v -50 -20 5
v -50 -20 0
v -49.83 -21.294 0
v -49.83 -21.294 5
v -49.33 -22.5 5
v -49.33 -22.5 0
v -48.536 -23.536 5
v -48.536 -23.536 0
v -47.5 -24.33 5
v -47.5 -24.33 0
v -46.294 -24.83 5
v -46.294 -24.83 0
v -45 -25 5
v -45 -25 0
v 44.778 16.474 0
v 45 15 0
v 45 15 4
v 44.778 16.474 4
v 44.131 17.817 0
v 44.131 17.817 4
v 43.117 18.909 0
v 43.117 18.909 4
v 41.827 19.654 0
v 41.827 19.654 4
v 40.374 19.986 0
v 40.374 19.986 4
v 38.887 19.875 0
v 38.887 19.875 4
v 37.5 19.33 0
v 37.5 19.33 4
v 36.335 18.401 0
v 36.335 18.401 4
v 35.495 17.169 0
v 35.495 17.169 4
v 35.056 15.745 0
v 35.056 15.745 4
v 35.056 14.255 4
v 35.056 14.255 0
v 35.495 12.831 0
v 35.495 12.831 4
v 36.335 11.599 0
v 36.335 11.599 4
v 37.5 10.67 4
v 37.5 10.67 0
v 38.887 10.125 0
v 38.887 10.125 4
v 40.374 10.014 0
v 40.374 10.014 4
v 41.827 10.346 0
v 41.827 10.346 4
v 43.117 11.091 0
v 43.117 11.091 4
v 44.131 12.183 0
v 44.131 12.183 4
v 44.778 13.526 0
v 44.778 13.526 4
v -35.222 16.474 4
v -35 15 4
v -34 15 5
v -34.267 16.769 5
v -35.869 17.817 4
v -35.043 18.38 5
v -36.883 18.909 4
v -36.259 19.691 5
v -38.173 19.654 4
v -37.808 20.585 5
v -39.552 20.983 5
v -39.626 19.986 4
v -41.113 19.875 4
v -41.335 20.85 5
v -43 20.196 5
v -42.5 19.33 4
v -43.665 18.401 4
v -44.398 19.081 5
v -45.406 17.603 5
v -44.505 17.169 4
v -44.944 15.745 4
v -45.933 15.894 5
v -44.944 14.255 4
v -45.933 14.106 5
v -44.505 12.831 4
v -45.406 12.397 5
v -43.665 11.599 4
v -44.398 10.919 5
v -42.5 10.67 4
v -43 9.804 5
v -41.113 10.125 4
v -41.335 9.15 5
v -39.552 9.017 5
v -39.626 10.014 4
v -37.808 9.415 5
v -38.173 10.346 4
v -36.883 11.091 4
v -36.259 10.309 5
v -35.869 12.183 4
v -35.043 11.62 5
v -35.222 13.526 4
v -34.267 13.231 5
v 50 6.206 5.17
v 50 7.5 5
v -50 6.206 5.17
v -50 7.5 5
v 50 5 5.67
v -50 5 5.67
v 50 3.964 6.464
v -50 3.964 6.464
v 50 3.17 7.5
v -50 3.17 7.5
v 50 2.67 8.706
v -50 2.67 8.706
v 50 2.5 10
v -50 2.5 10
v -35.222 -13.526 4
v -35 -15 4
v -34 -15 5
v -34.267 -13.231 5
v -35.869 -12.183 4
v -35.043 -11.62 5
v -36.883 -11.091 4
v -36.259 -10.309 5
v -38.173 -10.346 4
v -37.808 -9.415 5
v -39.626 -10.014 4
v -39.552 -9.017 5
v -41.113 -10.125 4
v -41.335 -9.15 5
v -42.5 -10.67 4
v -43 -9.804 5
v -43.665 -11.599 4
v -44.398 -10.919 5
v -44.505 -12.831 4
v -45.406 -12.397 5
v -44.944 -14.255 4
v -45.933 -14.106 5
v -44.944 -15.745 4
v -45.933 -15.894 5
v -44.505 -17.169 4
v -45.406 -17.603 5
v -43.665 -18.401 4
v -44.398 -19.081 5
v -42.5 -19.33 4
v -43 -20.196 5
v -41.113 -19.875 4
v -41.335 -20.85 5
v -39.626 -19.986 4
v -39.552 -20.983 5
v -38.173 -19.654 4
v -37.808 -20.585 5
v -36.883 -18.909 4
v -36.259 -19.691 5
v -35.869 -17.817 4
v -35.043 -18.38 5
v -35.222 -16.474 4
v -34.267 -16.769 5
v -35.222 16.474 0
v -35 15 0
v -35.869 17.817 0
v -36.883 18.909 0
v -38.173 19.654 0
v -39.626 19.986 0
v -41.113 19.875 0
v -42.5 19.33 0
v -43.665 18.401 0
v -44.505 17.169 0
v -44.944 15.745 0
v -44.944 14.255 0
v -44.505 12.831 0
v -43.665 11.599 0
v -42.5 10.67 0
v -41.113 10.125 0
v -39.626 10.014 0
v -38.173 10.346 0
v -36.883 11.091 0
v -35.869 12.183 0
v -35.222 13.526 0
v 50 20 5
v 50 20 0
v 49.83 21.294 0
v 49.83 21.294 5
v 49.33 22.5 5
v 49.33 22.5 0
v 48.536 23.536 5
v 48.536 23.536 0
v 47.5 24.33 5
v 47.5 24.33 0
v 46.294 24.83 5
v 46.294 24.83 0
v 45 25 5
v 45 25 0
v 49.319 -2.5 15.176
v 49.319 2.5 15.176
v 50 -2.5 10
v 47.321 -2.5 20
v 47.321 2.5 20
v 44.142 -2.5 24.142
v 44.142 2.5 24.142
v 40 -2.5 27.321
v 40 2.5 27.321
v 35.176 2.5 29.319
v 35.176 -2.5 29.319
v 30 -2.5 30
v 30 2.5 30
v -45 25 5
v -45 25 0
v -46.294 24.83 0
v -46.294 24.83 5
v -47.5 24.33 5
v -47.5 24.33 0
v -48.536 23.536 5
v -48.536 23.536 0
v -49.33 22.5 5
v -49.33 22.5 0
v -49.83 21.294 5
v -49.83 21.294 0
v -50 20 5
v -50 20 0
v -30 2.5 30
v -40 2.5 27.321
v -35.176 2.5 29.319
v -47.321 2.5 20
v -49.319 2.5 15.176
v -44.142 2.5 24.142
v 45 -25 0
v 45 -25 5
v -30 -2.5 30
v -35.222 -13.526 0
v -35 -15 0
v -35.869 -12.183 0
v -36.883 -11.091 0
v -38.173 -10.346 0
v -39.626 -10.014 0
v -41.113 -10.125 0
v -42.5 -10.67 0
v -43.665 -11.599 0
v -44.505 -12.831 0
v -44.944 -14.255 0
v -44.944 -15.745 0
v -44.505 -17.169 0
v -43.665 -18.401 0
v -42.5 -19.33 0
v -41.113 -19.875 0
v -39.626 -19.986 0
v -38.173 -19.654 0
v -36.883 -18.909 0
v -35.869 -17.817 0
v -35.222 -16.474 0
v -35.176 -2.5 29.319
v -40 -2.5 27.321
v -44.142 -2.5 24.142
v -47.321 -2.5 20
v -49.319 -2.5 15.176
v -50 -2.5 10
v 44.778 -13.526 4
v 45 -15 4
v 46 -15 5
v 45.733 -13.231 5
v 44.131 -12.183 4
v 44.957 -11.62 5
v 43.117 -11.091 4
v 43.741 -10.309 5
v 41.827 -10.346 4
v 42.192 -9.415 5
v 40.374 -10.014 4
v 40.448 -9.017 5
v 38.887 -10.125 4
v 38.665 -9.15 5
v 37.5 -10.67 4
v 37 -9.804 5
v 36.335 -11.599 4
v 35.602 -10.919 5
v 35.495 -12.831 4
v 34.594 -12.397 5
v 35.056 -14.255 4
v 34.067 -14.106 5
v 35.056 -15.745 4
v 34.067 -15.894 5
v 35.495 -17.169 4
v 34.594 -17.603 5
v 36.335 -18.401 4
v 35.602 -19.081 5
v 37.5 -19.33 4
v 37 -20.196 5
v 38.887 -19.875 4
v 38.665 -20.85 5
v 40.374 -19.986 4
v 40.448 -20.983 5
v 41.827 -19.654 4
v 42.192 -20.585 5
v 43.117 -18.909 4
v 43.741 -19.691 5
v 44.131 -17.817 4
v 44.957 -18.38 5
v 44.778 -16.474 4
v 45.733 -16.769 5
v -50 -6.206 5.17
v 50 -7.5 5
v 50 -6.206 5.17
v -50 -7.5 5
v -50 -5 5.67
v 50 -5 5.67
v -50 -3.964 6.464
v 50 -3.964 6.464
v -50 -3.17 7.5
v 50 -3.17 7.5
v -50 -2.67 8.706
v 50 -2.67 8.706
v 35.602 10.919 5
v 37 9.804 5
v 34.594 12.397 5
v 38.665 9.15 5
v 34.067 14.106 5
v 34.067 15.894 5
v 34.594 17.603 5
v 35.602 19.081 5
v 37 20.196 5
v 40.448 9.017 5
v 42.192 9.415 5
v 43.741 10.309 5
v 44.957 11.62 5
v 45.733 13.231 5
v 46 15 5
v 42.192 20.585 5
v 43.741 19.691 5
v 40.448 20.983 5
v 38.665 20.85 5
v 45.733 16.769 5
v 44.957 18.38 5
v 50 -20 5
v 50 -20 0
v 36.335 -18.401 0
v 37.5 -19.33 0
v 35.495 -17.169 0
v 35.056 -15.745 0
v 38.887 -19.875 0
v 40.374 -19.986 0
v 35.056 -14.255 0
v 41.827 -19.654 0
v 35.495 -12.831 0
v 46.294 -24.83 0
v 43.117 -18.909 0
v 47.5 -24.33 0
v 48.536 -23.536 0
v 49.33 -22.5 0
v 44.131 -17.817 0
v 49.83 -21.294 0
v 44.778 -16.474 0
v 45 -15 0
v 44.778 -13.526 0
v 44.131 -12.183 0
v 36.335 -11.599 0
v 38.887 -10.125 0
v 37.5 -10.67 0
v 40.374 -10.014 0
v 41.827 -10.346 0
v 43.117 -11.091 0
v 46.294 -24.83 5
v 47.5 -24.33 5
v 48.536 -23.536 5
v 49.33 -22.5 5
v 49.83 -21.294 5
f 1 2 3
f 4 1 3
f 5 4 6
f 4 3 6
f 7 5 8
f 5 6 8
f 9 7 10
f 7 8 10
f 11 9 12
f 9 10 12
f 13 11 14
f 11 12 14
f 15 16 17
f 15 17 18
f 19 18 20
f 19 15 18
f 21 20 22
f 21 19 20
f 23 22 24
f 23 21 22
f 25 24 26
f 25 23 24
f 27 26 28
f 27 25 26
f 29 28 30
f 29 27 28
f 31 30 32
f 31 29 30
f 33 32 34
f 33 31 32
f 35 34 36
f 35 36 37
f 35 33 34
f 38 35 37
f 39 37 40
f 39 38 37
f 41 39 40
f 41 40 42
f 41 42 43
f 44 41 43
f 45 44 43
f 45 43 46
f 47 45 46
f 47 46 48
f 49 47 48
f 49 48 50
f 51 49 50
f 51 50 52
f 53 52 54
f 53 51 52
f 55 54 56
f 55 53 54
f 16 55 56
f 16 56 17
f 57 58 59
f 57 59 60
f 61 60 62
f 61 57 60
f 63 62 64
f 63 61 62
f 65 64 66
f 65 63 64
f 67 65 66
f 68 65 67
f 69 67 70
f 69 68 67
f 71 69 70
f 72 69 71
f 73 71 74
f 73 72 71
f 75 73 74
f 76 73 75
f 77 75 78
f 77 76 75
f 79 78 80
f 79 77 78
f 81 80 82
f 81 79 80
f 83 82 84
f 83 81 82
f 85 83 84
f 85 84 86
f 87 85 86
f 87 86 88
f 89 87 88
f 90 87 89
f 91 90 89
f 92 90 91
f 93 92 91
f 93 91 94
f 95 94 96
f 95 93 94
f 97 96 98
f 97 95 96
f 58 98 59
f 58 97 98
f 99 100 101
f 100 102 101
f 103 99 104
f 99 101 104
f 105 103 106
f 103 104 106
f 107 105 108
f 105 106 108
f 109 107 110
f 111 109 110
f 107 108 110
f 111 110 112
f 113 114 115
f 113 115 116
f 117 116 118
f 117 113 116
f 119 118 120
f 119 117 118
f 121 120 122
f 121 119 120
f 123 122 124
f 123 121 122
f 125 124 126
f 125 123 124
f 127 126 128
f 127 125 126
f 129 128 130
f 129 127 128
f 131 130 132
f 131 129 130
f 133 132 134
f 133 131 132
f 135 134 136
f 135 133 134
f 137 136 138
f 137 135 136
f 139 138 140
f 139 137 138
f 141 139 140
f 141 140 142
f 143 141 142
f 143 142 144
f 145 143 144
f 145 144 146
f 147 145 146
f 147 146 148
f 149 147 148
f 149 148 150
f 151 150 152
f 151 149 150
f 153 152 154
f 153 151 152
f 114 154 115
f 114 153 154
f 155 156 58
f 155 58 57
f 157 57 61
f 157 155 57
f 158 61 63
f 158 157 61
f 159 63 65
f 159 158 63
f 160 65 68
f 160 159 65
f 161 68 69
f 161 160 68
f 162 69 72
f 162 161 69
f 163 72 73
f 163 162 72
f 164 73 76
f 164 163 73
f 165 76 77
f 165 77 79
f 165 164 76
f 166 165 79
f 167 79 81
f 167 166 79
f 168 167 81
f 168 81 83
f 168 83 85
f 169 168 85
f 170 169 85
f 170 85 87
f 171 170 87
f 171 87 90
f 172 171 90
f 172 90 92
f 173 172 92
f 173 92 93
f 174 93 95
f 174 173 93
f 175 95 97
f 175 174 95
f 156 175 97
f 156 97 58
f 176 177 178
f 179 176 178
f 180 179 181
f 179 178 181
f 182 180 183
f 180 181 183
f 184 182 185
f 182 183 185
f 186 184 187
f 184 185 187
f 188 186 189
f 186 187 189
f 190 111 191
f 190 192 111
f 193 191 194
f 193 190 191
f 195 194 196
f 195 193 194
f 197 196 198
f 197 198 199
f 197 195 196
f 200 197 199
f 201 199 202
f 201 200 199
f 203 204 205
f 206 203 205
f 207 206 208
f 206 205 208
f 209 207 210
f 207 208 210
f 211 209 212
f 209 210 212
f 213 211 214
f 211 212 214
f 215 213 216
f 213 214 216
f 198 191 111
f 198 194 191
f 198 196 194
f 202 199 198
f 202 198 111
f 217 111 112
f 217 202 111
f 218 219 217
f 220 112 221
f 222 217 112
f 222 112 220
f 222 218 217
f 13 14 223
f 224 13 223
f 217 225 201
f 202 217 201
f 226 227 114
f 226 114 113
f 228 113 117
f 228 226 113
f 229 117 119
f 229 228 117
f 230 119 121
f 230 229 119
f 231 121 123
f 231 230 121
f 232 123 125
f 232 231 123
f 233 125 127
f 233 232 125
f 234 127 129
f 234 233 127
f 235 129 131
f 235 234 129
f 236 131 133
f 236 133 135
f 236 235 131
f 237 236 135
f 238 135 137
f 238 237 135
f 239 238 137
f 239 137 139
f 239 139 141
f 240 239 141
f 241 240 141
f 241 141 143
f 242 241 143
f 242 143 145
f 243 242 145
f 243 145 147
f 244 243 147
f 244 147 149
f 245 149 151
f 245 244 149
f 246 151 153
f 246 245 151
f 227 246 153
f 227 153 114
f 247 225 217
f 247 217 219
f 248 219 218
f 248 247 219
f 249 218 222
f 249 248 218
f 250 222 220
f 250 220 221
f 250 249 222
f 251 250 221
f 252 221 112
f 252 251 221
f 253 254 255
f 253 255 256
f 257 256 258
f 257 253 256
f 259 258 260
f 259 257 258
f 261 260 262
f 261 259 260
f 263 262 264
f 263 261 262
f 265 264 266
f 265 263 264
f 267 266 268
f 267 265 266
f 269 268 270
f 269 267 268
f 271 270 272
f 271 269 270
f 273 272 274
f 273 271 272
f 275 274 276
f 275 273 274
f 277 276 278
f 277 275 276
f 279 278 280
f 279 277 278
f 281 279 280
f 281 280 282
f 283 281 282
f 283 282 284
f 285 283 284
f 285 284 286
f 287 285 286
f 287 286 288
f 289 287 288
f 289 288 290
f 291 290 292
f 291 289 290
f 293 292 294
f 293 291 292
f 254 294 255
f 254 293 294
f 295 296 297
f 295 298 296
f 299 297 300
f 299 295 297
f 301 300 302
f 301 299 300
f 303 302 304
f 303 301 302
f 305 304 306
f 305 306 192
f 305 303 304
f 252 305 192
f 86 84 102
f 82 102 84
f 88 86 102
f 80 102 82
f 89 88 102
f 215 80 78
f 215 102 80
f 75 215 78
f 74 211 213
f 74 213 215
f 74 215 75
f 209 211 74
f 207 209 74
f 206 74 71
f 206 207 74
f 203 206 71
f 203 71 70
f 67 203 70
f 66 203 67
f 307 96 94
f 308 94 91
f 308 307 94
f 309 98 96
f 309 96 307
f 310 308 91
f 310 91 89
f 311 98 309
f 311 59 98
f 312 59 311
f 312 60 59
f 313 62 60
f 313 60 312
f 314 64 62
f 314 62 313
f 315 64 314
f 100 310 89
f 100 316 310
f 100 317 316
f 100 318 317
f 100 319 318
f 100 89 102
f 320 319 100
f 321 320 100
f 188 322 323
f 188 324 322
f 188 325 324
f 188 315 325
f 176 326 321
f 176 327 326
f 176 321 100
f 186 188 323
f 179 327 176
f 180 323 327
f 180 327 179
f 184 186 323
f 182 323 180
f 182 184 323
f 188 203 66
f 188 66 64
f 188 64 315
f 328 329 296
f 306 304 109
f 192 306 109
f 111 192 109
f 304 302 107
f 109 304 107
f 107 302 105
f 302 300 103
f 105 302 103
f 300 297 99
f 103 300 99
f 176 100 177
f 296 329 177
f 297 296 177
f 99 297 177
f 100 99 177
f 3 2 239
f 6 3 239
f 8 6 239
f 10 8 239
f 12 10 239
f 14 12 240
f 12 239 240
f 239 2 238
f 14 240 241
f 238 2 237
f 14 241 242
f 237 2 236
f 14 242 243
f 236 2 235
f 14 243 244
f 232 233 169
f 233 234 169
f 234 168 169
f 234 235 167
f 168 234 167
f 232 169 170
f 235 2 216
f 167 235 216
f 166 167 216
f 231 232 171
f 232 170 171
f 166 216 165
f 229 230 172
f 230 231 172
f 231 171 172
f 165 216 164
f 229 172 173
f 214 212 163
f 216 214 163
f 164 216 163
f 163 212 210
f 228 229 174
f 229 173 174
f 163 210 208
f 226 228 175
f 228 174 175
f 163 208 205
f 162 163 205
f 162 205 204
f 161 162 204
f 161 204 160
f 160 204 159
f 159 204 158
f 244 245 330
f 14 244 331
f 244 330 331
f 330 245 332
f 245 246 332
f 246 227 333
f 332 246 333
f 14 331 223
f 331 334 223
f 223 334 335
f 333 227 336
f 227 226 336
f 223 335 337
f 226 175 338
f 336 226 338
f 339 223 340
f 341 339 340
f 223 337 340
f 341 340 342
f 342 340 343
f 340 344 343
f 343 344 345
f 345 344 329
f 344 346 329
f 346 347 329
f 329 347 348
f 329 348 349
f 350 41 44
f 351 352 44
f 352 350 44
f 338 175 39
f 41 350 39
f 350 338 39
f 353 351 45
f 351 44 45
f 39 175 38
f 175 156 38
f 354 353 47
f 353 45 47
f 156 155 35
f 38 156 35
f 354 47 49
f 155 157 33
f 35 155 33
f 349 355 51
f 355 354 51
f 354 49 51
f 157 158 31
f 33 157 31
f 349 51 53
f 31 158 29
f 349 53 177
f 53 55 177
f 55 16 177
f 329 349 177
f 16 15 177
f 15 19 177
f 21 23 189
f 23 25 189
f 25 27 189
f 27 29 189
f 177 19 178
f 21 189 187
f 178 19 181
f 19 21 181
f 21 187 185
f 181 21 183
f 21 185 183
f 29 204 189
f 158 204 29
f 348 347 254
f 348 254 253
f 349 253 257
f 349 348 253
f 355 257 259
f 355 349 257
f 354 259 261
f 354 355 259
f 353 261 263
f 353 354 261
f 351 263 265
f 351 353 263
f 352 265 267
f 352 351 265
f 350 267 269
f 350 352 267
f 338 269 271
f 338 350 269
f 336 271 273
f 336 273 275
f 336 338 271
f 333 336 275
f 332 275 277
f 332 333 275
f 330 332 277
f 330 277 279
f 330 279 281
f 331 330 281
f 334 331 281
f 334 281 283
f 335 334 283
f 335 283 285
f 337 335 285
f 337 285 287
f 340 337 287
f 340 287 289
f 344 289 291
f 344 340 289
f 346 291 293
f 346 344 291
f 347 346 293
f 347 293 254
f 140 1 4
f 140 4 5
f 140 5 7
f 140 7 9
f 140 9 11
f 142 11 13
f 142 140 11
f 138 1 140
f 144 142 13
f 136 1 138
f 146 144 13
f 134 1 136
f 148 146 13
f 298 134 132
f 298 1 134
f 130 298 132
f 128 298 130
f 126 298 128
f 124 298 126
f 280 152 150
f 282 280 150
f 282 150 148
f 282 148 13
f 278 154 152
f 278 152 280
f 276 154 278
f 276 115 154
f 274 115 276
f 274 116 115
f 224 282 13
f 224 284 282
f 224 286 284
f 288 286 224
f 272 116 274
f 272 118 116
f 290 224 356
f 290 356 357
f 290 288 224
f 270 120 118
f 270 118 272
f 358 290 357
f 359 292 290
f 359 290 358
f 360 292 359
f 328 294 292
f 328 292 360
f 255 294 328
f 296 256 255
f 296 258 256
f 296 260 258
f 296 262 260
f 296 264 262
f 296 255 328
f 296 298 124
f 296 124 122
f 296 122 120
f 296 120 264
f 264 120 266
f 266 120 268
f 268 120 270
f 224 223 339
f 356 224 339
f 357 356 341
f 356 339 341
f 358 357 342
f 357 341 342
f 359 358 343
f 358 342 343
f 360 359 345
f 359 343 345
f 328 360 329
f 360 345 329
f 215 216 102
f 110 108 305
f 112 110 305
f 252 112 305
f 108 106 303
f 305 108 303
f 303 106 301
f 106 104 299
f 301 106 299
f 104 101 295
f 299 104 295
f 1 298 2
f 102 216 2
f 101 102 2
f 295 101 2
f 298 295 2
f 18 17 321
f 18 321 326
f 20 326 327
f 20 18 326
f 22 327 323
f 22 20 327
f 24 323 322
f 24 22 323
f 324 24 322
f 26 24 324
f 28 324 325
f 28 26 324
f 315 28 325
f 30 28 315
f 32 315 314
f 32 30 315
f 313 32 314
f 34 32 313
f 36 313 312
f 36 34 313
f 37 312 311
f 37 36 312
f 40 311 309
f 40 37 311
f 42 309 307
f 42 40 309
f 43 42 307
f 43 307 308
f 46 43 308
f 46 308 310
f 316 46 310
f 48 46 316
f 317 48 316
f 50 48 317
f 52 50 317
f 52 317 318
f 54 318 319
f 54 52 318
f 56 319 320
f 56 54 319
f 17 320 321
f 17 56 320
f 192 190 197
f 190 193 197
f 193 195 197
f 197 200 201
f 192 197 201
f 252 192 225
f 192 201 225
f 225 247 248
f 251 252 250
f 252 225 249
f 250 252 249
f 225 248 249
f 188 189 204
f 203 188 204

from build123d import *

# Parameters (mm, degrees)
SKETCH_R     = 5
PAD_DEPTH    = 5
PAD001_DEPTH = 2.5
FILLET_R     = 5
CHAMFER_SIZE = 1


with BuildPart() as part:
    # Sketch → Pad (new body)
    with BuildSketch(Plane.XY):
        with BuildLine():
            Line((-50, 20), (-50, -20))
            ThreePointArc((-50, -20), (-48.535534, -23.535534), (-45, -25))
            Line((-45, -25), (45, -25))
            ThreePointArc((45, -25), (48.535534, -23.535534), (50, -20))
            Line((50, -20), (50, 20))
            ThreePointArc((50, 20), (48.535534, 23.535534), (45, 25))
            Line((45, 25), (-45, 25))
            ThreePointArc((-45, 25), (-48.535534, 23.535534), (-50, 20))
        make_face()
        with Locations((-40, 15)):
            Circle(SKETCH_R, mode=Mode.SUBTRACT)
        with Locations((40, 15)):
            Circle(SKETCH_R, mode=Mode.SUBTRACT)
        with Locations((40, -15)):
            Circle(SKETCH_R, mode=Mode.SUBTRACT)
        with Locations((-40, -15)):
            Circle(SKETCH_R, mode=Mode.SUBTRACT)
    extrude(amount=PAD_DEPTH)

    # Sketch001 → Pad001 (join, symmetric)
    with BuildSketch(Plane.XZ):
        with BuildLine():
            Line((-30, 30), (30, 30))
            ThreePointArc((50, 10), (44.142136, 24.142136), (30, 30))
            Line((50, 10), (50, 5))
            Line((50, 5), (-50, 5))
            Line((-50, 5), (-50, 10))
            ThreePointArc((-30, 30), (-44.142136, 24.142136), (-50, 10))
        make_face()
    extrude(amount=PAD001_DEPTH, both=True)

    # Fillet
    fillet_edges = [part.edges().sort_by_distance(p)[0] for p in [
        (0, -2.5, 5),
        (0, 2.5, 5),
    ]]
    fillet(fillet_edges, radius=FILLET_R)

    # Chamfer
    chamfer_edges = [part.edges().sort_by_distance(p)[0] for p in [
        (35, -15, 5),
        (-45, -15, 5),
        (-45, 15, 5),
        (35, 15, 5),
    ]]
    chamfer(chamfer_edges, length=CHAMFER_SIZE)


solid = part.part
